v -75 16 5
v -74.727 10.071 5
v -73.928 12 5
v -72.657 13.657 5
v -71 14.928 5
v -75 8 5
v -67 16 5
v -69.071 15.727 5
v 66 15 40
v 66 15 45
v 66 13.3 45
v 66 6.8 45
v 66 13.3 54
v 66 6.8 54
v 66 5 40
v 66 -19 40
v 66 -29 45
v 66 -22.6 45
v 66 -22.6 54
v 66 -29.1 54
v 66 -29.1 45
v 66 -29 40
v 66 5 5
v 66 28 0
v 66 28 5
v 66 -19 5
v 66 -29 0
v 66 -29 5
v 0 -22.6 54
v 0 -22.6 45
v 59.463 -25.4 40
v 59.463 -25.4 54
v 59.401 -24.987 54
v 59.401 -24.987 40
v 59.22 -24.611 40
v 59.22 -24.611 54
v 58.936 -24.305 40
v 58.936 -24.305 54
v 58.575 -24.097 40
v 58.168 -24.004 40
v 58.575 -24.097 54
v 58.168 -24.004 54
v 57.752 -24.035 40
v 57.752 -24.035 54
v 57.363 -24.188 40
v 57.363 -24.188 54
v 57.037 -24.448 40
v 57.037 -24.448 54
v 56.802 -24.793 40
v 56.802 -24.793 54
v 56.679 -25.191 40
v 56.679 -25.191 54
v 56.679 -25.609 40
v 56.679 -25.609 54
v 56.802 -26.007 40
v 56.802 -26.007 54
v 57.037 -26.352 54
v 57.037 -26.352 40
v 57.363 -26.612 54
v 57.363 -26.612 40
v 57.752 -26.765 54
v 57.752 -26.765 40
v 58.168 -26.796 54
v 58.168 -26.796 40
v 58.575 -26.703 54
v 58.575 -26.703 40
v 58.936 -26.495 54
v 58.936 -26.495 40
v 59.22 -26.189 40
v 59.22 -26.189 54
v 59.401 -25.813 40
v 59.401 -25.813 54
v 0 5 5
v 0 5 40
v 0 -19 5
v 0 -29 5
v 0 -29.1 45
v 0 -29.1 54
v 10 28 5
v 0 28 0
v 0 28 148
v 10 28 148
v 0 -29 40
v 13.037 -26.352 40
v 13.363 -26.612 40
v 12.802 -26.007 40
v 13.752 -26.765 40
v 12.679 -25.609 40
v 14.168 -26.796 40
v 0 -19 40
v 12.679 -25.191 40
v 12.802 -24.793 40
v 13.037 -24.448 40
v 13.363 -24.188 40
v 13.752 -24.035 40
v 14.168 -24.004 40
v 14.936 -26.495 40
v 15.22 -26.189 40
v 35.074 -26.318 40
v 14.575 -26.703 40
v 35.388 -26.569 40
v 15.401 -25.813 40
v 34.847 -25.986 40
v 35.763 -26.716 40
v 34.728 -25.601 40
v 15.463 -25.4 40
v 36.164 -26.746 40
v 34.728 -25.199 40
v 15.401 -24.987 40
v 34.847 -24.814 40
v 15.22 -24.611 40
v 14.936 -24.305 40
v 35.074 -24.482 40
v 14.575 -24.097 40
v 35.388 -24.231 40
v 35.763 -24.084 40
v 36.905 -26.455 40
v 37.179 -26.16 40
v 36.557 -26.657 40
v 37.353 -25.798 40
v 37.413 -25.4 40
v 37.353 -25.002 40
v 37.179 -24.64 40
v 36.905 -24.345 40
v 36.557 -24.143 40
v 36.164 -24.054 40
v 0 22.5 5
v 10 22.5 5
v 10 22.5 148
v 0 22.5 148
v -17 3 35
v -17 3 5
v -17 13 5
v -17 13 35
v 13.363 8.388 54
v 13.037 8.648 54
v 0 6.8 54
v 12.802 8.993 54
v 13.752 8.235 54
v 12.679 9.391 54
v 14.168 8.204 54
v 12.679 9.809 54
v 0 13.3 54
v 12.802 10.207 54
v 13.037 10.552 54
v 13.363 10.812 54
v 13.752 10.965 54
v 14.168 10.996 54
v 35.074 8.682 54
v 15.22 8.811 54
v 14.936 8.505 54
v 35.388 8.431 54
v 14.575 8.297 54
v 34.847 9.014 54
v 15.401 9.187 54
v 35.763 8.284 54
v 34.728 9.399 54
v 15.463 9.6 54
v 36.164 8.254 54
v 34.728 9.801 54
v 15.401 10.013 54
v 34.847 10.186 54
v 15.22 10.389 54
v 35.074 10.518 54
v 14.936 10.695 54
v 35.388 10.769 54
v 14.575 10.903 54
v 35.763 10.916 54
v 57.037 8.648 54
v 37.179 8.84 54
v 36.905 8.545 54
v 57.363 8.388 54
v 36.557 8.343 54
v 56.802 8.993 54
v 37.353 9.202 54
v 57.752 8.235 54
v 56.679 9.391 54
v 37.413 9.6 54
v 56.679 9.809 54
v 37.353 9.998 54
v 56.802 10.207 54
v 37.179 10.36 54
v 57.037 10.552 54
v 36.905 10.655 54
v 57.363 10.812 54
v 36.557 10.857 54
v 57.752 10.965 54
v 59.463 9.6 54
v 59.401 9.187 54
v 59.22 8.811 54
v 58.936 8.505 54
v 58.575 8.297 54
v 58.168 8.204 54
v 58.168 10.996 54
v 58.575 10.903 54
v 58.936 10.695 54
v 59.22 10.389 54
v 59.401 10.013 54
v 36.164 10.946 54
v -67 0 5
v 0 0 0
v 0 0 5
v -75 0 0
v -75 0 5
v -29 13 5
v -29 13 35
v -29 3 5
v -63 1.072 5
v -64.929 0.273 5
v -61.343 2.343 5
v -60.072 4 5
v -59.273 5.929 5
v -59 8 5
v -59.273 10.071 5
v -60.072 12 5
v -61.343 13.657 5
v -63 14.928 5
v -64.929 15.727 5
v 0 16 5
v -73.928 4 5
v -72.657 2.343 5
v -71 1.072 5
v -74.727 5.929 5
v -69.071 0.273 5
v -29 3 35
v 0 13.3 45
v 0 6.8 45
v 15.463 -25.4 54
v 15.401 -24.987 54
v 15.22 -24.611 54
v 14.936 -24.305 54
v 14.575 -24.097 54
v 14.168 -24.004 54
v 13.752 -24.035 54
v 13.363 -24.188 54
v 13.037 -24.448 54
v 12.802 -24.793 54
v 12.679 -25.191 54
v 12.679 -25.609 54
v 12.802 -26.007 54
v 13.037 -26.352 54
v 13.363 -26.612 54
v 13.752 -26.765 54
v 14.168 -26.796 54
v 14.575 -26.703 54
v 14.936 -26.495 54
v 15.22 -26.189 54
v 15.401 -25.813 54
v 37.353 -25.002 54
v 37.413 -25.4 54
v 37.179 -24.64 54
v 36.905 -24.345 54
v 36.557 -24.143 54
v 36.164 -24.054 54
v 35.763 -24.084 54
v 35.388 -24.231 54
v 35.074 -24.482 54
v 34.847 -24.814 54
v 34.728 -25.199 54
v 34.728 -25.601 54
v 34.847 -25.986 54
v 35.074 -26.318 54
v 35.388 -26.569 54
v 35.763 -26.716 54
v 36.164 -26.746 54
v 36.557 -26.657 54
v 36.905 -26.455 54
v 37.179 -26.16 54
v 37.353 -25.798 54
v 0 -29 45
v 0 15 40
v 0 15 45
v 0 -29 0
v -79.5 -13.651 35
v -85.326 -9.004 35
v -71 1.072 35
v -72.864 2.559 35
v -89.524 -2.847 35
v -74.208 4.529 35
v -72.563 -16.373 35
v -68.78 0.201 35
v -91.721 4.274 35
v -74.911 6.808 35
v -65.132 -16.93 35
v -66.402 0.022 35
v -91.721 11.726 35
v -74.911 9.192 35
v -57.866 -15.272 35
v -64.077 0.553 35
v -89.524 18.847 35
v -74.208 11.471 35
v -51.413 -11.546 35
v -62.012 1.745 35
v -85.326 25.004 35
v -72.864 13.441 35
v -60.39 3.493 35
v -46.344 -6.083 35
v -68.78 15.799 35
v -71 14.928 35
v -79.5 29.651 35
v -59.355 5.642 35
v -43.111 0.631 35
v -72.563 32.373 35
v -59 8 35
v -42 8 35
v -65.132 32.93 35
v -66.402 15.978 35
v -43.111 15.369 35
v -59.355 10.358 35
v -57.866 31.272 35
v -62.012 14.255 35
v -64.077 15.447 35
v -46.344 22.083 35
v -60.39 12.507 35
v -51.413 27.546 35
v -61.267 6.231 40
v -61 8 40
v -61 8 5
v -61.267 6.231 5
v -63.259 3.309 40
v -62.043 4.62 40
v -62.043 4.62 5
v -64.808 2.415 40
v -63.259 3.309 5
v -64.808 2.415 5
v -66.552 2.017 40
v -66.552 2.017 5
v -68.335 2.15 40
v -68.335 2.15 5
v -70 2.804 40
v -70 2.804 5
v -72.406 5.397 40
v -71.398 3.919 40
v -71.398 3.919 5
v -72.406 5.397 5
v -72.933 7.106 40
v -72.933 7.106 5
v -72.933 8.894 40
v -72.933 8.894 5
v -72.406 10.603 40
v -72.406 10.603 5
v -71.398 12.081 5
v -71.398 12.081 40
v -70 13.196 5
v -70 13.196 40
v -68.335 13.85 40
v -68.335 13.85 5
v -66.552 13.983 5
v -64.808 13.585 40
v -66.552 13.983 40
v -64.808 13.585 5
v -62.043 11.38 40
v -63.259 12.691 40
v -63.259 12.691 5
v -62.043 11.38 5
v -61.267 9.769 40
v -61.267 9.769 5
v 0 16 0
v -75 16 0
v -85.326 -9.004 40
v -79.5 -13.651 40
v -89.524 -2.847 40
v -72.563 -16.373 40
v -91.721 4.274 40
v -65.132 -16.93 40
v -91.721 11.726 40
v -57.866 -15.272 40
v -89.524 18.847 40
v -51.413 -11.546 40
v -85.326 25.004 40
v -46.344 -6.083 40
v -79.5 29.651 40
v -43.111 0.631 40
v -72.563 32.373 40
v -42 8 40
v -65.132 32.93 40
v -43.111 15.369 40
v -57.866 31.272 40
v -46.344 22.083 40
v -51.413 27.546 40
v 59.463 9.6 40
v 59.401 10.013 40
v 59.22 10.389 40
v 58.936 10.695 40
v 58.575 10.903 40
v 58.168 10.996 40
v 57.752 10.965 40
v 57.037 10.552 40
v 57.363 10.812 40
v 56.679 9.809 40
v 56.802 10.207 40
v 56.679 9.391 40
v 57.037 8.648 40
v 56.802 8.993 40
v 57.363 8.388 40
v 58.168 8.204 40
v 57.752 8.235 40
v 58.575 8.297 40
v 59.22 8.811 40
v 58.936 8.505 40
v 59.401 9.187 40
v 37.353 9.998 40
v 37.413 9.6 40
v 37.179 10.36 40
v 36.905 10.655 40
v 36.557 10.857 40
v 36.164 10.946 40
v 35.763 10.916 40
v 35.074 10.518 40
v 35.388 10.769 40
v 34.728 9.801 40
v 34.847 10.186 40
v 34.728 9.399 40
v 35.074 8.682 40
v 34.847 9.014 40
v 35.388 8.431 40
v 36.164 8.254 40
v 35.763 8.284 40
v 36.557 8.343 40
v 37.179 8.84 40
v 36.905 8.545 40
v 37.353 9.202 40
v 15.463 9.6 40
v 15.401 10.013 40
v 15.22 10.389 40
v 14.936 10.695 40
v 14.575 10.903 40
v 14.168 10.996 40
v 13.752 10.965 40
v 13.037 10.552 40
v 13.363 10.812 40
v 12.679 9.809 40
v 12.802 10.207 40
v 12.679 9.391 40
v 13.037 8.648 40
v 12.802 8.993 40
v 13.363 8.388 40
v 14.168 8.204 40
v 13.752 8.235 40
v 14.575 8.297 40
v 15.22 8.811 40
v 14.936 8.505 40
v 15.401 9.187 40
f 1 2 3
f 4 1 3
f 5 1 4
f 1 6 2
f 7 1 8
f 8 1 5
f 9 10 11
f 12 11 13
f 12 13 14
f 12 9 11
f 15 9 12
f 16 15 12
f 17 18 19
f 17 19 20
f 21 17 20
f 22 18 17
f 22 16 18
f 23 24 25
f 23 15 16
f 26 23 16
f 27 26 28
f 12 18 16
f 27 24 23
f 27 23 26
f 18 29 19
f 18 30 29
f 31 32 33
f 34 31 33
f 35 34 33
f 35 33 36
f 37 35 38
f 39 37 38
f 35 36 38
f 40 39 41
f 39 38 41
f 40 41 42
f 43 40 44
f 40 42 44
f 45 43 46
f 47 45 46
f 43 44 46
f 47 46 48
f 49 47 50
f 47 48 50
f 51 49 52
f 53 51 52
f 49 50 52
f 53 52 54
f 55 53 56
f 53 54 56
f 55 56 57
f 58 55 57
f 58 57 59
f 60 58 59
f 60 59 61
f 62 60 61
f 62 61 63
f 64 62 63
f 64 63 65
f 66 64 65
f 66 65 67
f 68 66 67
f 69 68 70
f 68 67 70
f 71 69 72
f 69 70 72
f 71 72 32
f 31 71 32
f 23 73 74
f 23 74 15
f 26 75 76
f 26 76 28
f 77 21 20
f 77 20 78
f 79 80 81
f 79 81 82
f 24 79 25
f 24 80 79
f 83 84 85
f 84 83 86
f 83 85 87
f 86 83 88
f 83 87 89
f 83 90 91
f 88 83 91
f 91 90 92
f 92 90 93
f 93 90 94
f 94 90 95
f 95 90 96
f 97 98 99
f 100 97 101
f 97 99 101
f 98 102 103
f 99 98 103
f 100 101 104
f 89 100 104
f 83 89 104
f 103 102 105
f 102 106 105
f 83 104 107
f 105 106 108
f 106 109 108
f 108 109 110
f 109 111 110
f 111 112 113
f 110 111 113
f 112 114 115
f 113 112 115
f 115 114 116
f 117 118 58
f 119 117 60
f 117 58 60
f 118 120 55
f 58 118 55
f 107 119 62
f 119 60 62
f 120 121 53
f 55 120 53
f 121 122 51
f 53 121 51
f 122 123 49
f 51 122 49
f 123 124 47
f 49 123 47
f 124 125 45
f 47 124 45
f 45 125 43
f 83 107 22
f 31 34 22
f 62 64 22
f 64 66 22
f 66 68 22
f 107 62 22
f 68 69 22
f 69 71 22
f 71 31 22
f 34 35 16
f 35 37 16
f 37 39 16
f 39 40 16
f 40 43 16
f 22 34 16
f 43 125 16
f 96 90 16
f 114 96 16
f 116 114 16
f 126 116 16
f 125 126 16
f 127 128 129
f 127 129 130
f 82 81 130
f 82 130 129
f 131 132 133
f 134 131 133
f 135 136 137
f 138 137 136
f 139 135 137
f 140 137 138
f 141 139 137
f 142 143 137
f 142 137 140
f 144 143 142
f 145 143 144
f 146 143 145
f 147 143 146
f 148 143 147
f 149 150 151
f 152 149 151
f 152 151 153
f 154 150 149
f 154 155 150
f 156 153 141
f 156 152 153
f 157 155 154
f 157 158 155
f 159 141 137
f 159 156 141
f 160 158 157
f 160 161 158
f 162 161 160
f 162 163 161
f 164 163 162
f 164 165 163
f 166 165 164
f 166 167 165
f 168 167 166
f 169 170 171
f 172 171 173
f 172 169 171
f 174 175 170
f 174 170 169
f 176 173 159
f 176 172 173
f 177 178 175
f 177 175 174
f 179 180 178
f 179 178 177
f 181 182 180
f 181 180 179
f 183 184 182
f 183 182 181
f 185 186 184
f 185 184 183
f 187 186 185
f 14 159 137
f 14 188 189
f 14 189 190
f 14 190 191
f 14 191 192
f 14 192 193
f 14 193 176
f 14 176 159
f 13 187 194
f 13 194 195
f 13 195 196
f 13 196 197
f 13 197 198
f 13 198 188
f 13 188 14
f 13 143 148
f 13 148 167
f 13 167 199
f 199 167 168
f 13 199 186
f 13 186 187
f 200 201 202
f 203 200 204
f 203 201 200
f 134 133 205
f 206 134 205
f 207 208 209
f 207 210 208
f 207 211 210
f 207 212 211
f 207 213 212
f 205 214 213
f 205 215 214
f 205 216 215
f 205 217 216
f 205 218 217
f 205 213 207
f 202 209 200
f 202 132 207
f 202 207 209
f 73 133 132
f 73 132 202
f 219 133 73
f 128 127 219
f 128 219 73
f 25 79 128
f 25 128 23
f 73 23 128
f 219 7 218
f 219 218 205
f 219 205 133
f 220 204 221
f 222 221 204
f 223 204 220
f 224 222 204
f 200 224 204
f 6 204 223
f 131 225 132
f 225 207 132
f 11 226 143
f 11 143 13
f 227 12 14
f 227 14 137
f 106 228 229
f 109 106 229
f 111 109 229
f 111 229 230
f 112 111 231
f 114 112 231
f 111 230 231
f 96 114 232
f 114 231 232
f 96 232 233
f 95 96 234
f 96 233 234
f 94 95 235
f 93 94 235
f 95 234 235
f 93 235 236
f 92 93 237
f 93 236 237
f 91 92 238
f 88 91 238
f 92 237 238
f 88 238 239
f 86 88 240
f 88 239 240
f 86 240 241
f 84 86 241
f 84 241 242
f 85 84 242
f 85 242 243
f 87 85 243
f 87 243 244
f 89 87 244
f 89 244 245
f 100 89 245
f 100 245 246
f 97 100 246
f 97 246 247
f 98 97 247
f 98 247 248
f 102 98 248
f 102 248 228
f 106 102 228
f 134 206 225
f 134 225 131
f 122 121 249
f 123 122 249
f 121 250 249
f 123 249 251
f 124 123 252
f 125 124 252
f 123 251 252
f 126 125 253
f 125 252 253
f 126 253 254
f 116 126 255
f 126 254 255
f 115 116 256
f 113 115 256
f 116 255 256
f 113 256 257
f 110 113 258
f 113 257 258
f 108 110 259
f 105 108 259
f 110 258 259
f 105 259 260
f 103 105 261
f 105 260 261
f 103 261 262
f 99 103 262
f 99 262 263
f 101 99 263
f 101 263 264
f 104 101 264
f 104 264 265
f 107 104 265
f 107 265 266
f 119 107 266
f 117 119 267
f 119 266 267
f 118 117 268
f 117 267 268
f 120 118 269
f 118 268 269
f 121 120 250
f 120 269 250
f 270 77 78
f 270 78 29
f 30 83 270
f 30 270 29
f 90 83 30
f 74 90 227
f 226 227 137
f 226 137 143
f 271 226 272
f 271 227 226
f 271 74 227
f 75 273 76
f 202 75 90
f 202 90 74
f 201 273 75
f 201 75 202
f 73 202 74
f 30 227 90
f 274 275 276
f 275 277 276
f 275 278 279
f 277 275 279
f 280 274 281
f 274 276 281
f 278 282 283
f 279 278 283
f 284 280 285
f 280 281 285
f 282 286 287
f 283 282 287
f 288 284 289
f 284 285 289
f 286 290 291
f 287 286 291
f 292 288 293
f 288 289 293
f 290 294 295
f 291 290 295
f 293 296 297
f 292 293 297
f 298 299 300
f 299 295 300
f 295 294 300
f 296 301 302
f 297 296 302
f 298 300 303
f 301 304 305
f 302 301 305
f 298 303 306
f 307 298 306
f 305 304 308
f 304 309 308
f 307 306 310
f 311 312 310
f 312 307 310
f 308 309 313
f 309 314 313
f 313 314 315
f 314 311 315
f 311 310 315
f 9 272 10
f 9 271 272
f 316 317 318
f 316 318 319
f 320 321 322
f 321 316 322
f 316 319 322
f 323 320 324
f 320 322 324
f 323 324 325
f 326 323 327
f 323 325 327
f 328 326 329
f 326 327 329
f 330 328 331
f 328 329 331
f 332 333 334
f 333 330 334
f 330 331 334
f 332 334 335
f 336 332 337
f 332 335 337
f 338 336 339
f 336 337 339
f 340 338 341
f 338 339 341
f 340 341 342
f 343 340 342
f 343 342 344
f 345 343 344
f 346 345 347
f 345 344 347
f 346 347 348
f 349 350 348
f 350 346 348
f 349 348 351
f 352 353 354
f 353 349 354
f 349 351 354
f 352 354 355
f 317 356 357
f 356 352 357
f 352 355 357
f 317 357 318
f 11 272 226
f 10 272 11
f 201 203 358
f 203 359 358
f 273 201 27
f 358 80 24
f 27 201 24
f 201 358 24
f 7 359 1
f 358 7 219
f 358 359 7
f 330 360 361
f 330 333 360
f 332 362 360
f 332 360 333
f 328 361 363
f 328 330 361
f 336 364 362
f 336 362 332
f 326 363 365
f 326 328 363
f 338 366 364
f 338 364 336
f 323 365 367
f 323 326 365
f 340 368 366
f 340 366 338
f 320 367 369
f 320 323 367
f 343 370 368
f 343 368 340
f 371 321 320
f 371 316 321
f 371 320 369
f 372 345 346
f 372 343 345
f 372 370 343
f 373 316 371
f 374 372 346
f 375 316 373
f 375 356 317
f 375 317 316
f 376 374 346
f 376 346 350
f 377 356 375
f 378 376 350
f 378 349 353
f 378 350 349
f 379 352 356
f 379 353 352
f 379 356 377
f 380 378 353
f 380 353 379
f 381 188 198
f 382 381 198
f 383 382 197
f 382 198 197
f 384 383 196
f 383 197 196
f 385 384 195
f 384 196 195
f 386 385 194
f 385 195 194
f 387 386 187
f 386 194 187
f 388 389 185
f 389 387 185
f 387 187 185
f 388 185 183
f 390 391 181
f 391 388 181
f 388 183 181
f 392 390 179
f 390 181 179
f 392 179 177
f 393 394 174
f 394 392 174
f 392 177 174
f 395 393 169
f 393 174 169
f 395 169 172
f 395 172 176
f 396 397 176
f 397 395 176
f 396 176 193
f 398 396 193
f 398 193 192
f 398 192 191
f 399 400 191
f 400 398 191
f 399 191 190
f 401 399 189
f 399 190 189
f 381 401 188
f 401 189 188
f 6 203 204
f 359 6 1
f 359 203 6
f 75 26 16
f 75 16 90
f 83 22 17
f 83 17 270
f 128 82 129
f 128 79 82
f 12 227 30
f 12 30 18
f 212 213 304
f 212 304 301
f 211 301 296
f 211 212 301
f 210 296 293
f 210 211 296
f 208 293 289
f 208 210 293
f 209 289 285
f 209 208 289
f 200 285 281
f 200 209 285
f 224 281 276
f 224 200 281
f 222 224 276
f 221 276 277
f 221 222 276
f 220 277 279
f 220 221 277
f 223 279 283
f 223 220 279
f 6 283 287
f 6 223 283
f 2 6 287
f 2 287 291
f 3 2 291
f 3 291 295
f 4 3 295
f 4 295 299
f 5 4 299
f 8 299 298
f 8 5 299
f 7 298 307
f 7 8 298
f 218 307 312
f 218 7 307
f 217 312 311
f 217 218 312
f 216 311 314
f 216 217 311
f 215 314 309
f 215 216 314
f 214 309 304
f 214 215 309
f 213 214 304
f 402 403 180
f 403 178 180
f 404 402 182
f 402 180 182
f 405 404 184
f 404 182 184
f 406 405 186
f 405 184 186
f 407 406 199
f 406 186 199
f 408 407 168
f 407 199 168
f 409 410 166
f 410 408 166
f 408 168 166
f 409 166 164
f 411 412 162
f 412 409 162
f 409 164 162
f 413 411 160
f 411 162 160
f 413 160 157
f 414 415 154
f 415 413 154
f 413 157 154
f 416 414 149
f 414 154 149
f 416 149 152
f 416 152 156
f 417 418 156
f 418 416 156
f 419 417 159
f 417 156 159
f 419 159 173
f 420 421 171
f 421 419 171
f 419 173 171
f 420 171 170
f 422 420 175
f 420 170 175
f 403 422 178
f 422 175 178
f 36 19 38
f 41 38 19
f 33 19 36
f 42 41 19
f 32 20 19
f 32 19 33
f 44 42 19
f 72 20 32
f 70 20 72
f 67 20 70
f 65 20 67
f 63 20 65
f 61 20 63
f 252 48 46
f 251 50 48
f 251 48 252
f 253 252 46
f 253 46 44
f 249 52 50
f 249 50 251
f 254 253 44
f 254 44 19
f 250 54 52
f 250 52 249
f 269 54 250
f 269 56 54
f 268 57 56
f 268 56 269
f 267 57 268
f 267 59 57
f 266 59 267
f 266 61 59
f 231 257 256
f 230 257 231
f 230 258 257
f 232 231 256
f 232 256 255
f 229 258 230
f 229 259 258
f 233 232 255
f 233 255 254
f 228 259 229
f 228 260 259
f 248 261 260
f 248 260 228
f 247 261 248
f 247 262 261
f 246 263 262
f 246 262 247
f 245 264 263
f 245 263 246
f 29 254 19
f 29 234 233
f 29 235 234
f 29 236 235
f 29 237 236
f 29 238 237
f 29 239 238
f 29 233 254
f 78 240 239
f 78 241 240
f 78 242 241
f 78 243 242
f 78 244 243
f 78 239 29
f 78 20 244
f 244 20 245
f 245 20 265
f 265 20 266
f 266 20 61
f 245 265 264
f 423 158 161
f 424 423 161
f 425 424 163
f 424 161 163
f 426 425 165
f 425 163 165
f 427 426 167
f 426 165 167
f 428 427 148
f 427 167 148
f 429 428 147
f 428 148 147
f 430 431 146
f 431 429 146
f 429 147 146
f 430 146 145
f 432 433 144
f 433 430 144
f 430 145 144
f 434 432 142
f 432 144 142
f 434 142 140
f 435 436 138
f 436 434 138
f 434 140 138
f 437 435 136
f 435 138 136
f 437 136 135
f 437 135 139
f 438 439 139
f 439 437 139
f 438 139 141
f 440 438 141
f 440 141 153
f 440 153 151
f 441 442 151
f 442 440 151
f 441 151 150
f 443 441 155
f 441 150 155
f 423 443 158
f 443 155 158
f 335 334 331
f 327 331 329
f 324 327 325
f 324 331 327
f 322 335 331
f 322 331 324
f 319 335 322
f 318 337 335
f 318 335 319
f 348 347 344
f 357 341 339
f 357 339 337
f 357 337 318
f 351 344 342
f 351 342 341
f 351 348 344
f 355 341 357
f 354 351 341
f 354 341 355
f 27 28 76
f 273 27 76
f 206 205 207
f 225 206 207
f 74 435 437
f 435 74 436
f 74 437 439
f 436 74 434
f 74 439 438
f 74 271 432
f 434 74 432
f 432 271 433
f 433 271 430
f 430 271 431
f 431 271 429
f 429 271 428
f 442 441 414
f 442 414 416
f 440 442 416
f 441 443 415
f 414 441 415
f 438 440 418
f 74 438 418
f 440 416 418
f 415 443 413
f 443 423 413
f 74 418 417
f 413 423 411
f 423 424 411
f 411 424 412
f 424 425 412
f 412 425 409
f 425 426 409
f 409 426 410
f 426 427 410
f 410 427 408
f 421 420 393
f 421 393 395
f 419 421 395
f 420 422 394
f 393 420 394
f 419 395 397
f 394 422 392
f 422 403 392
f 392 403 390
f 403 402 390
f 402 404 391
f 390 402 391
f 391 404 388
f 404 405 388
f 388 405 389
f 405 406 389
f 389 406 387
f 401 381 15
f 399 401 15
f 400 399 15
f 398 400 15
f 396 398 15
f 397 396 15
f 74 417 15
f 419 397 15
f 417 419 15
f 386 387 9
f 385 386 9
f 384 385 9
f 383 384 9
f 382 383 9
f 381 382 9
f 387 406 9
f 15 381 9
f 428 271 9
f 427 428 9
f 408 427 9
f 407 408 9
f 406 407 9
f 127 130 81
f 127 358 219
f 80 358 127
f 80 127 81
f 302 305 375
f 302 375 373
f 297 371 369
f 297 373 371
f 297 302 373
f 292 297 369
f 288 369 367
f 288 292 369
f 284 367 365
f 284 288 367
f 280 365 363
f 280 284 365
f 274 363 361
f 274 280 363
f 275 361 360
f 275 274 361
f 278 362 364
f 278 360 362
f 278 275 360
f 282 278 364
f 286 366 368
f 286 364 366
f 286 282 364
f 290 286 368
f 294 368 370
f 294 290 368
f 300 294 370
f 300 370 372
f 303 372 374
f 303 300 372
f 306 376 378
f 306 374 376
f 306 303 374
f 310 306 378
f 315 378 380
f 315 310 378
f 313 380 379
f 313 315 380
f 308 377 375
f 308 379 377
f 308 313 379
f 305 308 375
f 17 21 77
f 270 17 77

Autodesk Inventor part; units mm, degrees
ref_plane "YZ Plane" through (0, 0, 0) normal (1, 0, 0) x (0, 1, 0)
ref_plane "XZ Plane" through (0, 0, 0) normal (0, 1, 0) x (-1, 0, 0)
ref_plane "XY Plane" through (0, 0, 0) normal (0, 0, 1) x (1, 0, 0)
sketch "Skizze1" plane through (0, 0, 0) normal (0, 0, 1) x (1, 0, 0)
  line L0 (0, 0) -> (-75, 0)
  line L1 (-75, 0) -> (-75, 16)
  line L2 (-75, 16) -> (0, 16)
  line L3 (0, 16) -> (0, 0)
  dimension "d0" = 75
  dimension "d1" = 16
extrude "Extrusion1" add sketch "Skizze1" along normal blind 5
sketch "Skizze2" plane through (0, 0, 5) normal (0, 0, 1) x (1, 0, 0)
  line L0 (0, 0) -> (0, 16) construction
  line L1 (-75, 0) -> (0, 0) construction
  line L2 (0, 0) -> (-75, 0) construction
  line L3 (-75, 0) -> (-75, 16) construction
  line L4 (-75, 16) -> (-75, 0) construction
  line L5 (-75, 16) -> (-59, 16) construction
  line L6 (-59, 16) -> (-59, 0) construction
  line L7 (-59, 16) -> (-75, 0) construction
  line L8 (-75, 16) -> (-59, 0) construction
  circle A0 centre (-67, 8) radius 8
  circle A1 centre (-67, 8) radius 6
  dimension "d4" = 16
  dimension "d5" = 16
  dimension "d6" = 16
  dimension "d7" = 12
extrude "Extrusion2" add sketch "Skizze2" along normal blind 30
sketch "Skizze3" plane through (-67, 8, 35) normal (0, 0, 1) x (1, 0, 0)
  circle A0 centre (0, 0) radius 6 construction
  line L0 (-6, 0) -> (6, 0) construction
  line L1 (0, 6) -> (0, -6) construction
  circle A1 centre (0, 0) radius 25
  circle A2 centre (0, 0) radius 6
  point P0 (67, -8)
  dimension "d10" = 50
extrude "Extrusion4" add sketch "Skizze3" along normal blind 5
sketch "Skizze4" plane through (0, 0, 5) normal (0, 0, 1) x (1, 0, 0)
  circle A0 centre (-67, 8) radius 6 construction
  line L0 (-67, 8) -> (-17, 8) construction
  line L1 (-17, 8) -> (-17, 13) construction
  line L2 (-17, 13) -> (-29, 13) construction
  line L3 (-29, 13) -> (-29, 3) construction
  line L4 (-29, 3) -> (-17, 3)
  line L5 (-17, 3) -> (-17, 13)
  line L6 (-17, 13) -> (-29, 13)
  line L7 (-29, 13) -> (-29, 3)
  point P0 (0, 0)
  dimension "d15" = 50
  dimension "d16" = 5
  dimension "d17" = 12
  dimension "d18" = 10
extrude "Extrusion5" add sketch "Skizze4" along normal blind 30
sketch "Skizze5" plane through (0, 0, 5) normal (0, 0, 1) x (1, 0, 0)
  circle A0 centre (-67, 8) radius 6 construction
  line L0 (-67, 8) -> (0, 8) construction
  line L1 (0, 0) -> (0, 16) construction
  line L2 (0, 8) -> (0, -29) construction
  line L3 (0, -29) -> (66, -29) construction
  line L4 (0, 8) -> (0, 28) construction
  line L5 (66, -29) -> (0, -29)
  line L6 (0, -29) -> (0, 28)
  line L7 (0, 28) -> (66, 28)
  line L8 (66, 28) -> (66, -29)
  dimension "d21" = 67
  dimension "d22" = 37
  dimension "d23" = 66
  dimension "d24" = 20
extrude "Extrusion6" add sketch "Skizze5" against normal blind 5
sketch "Skizze6" plane through (0, 0, 5) normal (0, 0, 1) x (1, 0, 0)
  line L0 (0, -29) -> (0, 0) construction
  line L1 (0, -29) -> (0, 15) construction
  line L2 (0, 15) -> (66, 15) construction
  line L3 (66, 28) -> (66, -29) construction
  line L4 (0, 15) -> (0, 5) construction
  line L5 (66, -29) -> (0, -29) construction
  line L6 (66, -29) -> (66, -19) construction
  line L7 (0, 5) -> (66, 5)
  line L8 (66, 5) -> (66, -19)
  line L9 (66, -19) -> (0, -19)
  line L10 (0, -19) -> (0, 5)
  dimension "d27" = 44
  dimension "d28" = 66
  dimension "d42" = 10
  dimension "d43" = 10
extrude "Extrusion7" add sketch "Skizze6" along normal blind 35
sketch "Skizze7" plane through (0, 0, 5) normal (0, 0, 1) x (1, 0, 0)
  line L0 (-67, 6.9194) -> (0, 7.5) construction
  line L1 (0, 0) -> (0, -19) construction
  line L2 (0, 7.5) -> (0, 22.5) construction
  line L3 (0, 22.5) -> (10, 22.5) construction
  line L4 (0, 28) -> (66, 28) projected
  line L5 (10, 22.5) -> (0, 22.5)
  line L6 (0, 22.5) -> (0, 28)
  line L7 (0, 28) -> (10, 28)
  line L8 (10, 28) -> (10, 22.5)
  point P0 (0, 15)
  dimension "d31" = 15
  dimension "d32" = 10
extrude "Extrusion8" add sketch "Skizze7" along normal blind 143
sketch "Skizze9" plane through (0, 0, 40) normal (0, 0, 1) x (1, 0, 0)
  line L0 (0, 0) -> (0, 5) construction
  line L1 (0, 5) -> (0, 15) construction
  line L2 (0, 15) -> (66, 15) construction
  line L3 (66, 28) -> (66, -29) construction
  line L4 (66, 15) -> (66, -29) construction
  line L5 (66, -29) -> (0, -29) projected
  line L6 (0, 15) -> (66, 15)
  line L7 (66, 15) -> (66, -29)
  line L8 (66, -29) -> (0, -29)
  line L9 (0, -29) -> (0, 15)
  dimension "d44" = 10
  dimension "d45" = 66
extrude "Extrusion10" add sketch "Skizze9" along normal blind 5
sketch "Skizze10" plane through (0, 0, 45) normal (0, 0, 1) x (1, 0, 0)
  circle A0 centre (-67, 8) radius 6 construction
  line L0 (-67, 8) -> (0, 8) construction
  line L1 (0, 8) -> (0, -7) construction
  line L2 (0, 0) -> (0, 5) construction
  line L3 (0, -7) -> (0, 13.3) construction
  line L4 (0, 13.3) -> (66, 13.3) construction
  line L5 (66, 28) -> (66, -29) construction
  line L6 (66, 13.3) -> (66, 6.8) construction
  line L7 (66, 6.8) -> (0, 6.8) construction
  line L8 (66, 5) -> (0, 5) construction
  line L9 (66, 6.8) -> (132, 6.8) construction
  line L10 (0, 13.3) -> (0, 6.8) construction
  line L11 (0, 5) -> (0, 15) construction
  line L12 (0, 13.3) -> (66, 13.3)
  line L13 (66, 13.3) -> (66, 6.8)
  line L14 (66, 6.8) -> (0, 6.8)
  line L15 (0, 6.8) -> (0, 13.3)
  dimension "d48" = 15
  dimension "d49" = 20.3
  dimension "d50" = 66
  dimension "d51" = 6.5
  dimension "d52" = 66
  dimension "d53" = 180
  dimension "d54" = 6.5
extrude "Extrusion11" add sketch "Skizze10" along normal blind 9
ref_plane "Arbeitsebene2" through (0, -7.9, 45) normal (0, -1, 0) x (1, 0, 0)
mirror "Spiegeln1" about plane through (0, -7.9, 45) normal (0, -1, 0) of "Extrusion11"
sketch "Skizze13" plane through (0, -29.1, 54) normal (0, 0, 1) x (1, 0, 0)
  circle A0 centre (14.0634, 3.7) radius 1.35 projected
  circle A1 centre (36.0634, 3.7) radius 1.35 projected
  circle A2 centre (58.0634, 3.7) radius 1.35 projected
  circle A3 centre (14.0634, 3.7) radius 1.4
  circle A4 centre (36.0634, 3.7) radius 1.4
  circle A5 centre (58.0634, 3.7) radius 1.4
  point P0 (0, 29.1)
  dimension "d58" = 2.8
  dimension "d59" = 2.8
  dimension "d60" = 2.8
extrude "Extrusion12" cut sketch "Skizze13" against normal up to next contours A0 | A1 | A2 | A3 | A5
mirror "Spiegeln2" about plane through (0, -7.9, 45) normal (0, -1, 0) of "Extrusion12"
equation "\"d61\" = d60"
properties part number "base"
